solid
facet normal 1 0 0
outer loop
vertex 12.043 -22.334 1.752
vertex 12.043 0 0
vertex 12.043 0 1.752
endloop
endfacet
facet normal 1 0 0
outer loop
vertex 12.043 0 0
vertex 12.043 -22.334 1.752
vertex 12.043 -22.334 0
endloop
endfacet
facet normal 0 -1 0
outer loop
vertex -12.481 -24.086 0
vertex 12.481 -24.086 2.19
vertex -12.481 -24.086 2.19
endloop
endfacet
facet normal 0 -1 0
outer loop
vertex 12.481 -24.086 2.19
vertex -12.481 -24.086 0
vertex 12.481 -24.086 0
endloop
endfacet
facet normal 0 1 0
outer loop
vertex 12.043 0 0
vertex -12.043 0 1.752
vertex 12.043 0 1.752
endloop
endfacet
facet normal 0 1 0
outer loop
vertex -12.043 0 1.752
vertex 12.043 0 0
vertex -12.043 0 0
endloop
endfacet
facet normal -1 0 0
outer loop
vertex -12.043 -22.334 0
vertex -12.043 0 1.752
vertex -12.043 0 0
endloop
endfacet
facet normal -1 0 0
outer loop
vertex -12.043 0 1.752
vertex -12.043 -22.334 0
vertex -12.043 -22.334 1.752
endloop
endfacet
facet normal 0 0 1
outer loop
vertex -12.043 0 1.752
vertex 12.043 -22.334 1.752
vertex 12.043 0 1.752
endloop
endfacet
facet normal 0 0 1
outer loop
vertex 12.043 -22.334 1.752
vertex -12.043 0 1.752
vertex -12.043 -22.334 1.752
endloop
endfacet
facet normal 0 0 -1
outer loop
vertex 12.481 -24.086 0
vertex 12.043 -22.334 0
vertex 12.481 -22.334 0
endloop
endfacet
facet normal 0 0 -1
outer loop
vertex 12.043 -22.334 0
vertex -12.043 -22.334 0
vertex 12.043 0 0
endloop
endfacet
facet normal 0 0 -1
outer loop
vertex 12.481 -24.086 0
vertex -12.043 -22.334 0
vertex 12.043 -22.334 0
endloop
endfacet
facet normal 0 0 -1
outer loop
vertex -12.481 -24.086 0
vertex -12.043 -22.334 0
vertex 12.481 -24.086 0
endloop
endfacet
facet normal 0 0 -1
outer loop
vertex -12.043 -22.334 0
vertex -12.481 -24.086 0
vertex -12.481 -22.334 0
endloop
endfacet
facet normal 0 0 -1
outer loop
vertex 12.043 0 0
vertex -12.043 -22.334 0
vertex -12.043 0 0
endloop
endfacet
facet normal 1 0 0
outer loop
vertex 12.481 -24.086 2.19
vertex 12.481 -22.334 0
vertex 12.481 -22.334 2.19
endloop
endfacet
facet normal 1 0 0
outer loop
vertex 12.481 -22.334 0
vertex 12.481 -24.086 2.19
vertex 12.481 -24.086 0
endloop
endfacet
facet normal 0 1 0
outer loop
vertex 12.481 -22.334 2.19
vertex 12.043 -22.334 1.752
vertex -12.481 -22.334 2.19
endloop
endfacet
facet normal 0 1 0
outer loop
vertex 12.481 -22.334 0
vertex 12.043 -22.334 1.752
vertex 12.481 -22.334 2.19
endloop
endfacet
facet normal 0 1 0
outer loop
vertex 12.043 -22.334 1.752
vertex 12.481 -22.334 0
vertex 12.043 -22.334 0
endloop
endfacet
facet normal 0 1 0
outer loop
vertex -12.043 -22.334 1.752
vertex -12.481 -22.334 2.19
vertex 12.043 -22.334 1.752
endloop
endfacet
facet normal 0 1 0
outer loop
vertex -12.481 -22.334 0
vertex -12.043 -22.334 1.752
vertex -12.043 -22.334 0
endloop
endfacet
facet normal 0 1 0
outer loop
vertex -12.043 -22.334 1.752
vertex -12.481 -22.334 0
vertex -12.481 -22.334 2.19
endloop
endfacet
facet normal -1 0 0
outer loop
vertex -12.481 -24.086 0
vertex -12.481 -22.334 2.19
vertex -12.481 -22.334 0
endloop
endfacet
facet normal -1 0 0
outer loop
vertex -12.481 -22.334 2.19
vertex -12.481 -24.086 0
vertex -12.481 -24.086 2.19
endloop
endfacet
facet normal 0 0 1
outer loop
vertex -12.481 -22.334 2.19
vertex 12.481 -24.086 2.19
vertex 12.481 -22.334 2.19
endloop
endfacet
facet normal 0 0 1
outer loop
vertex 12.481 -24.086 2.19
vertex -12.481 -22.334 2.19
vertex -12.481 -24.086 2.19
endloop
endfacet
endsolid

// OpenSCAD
// =====================================================================
//  VIEW 03: TOOLBOX  -  print 1
//  Milwaukee Road 1939 rib side bay window caboose - G scale (1:29)
//  Toolbox / access door box (Side A)
//  Print orientation: on its back
//
//  Open this file in OpenSCAD to look at just this part.
//  To export this part's STL: Render (F6), then File > Export > STL.
//  The part's code lives in library/toolbox.scad; settings in
//  library/caboose_params.scad.
// =====================================================================

part     = "toolbox";    // which part - leave as is
view     = "print";  // "print"     = laid out as it goes on the printer bed
                     //               (same as the exported STL)
                     // "installed" = in its place on the car (all copies)
show_car = false;    // with "installed": faint see-through body, roof and
                     //   underframe around it for context

include <../library/caboose_all.scad>

if (view == "installed") {
    caboose_installed(part);
    if (show_car) car_ghost();
} else {
    caboose_print(part);
}
echo(str("toolbox: print 1"));
